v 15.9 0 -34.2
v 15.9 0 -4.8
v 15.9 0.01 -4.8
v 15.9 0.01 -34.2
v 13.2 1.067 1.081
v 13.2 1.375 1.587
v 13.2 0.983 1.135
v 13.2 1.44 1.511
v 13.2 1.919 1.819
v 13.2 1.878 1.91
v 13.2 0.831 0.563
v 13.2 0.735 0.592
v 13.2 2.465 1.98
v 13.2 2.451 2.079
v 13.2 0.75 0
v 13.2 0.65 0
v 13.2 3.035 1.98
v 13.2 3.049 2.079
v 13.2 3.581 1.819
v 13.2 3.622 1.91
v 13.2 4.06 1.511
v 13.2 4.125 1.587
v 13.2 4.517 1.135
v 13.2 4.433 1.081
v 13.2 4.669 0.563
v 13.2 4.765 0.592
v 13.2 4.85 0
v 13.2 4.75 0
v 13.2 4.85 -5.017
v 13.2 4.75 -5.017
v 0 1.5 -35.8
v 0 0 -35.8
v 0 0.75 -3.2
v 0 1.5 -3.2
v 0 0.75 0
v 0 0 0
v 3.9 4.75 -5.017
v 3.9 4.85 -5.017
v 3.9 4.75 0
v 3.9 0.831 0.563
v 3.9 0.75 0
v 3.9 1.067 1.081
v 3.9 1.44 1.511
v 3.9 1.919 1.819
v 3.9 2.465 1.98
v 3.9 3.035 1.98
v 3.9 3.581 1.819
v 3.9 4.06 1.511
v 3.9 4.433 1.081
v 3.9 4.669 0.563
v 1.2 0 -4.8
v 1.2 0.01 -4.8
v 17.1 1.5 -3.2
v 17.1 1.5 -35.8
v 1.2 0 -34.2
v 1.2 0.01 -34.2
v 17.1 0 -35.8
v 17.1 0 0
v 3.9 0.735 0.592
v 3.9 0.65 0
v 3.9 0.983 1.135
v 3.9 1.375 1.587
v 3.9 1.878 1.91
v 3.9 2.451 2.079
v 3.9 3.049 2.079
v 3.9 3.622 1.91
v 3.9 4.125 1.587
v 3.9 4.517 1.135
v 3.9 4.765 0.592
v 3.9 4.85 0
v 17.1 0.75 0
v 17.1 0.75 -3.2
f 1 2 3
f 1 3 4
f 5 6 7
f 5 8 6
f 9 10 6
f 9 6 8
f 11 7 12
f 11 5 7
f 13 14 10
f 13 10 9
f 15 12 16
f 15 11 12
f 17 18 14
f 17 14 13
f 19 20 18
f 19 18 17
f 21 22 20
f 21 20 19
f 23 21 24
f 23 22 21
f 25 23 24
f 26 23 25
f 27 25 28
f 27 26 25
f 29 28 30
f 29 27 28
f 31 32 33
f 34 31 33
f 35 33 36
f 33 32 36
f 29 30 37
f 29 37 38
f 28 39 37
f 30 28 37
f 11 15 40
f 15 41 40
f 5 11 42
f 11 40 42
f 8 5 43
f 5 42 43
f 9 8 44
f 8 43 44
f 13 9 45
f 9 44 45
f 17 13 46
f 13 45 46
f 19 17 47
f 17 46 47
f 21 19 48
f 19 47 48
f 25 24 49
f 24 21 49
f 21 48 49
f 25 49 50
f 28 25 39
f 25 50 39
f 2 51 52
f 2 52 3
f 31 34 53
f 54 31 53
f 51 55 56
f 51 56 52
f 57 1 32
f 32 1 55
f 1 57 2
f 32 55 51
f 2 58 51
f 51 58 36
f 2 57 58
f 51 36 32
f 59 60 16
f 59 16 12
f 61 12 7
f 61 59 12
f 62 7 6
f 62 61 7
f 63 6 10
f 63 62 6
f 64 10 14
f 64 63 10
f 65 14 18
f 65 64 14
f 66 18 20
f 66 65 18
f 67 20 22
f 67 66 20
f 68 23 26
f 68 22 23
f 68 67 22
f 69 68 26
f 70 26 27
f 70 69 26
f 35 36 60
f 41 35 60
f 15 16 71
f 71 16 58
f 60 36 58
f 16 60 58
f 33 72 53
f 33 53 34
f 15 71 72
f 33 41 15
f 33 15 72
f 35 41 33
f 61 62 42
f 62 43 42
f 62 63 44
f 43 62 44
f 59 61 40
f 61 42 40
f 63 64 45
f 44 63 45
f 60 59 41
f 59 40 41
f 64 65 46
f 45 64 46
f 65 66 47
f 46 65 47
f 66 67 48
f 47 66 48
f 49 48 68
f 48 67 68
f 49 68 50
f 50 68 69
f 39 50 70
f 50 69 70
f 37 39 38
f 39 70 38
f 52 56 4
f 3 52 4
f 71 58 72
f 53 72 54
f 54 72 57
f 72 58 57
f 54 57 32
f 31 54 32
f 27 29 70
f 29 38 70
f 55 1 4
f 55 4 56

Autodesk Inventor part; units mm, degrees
ref_plane "YZ Plane" through (0, 0, 0) normal (1, 0, 0) x (0, 1, 0)
ref_plane "XZ Plane" through (0, 0, 0) normal (0, 1, 0) x (-1, 0, 0)
sketch "Эскиз1" plane through (0, 0, 0) normal (0, 1, 0) x (-1, 0, 0)
  line L0 (0, 0) -> (-17.1, 0)
  line L1 (-17.1, 0) -> (-17.1, -35.8)
  line L2 (-17.1, -35.8) -> (0, -35.8)
  line L3 (0, -35.8) -> (0, 0)
  dimension "d0" = 17.1
  dimension "d1" = 35.8
extrude "Выдавливание1" add sketch "Эскиз1" along normal blind 0.75
sketch "Эскиз2" plane through (0, 0.75, 0) normal (0, 1, 0) x (1, 0, 0)
  line L0 (0, 35.8) -> (0, 0) projected
  line L1 (17.1, 0) -> (17.1, 35.8) projected
  line L2 (0, 35.8) -> (17.1, 35.8)
  line L3 (17.1, 35.8) -> (17.1, 3.2)
  line L4 (17.1, 3.2) -> (0, 3.2)
  line L5 (0, 3.2) -> (0, 35.8)
  point P0 (0, 3.2)
  dimension "d4" = 32.6
extrude "Выдавливание2" add sketch "Эскиз2" along normal blind 0.75
sketch "Эскиз3" plane through (0, 0, 0) normal (0, -1, 0) x (1, 0, 0)
  line L0 (0, -35.8) -> (0, -3.2) projected
  line L1 (0, -3.2) -> (17.1, -3.2) projected
  line L2 (17.1, -3.2) -> (17.1, -35.8) projected
  line L3 (17.1, -35.8) -> (0, -35.8) projected
  line L4 (15.9, -34.2) -> (1.2, -34.2)
  line L5 (1.2, -34.2) -> (1.2, -4.8)
  line L6 (1.2, -4.8) -> (15.9, -4.8)
  line L7 (15.9, -4.8) -> (15.9, -34.2)
  point P0 (0, 0)
  point P1 (8.55, -34.2)
  point P2 (8.55, -35.8)
  point P3 (15.9, -19.5)
  point P4 (17.1, -19.5)
  dimension "d7" = 29.4
  dimension "d8" = 14.7
extrude "Выдавливание3" cut sketch "Эскиз3" against normal blind 0.01 contours L4 L5 L6 L7
ref_plane "РабПлоскость1" through (8.55, 0, 0) normal (1, 0, 0) x (0, 0, -1)
sketch "Эскиз4" plane through (8.55, 0, 0) normal (1, 0, 0) x (0, 0, -1)
  line L0 (0, 0) -> (0, 0.75) projected
  arc A0 (0, 4.75) -> (0, 0.75) centre (0, 2.75) ccw
  arc A1 (0, 4.85) -> (0, 0.65) centre (0, 2.75) ccw
  line L1 (0, 4.75) -> (5.0168, 4.75)
  line L2 (5.0168, 4.75) -> (5.0168, 4.85)
  line L3 (5.0168, 4.85) -> (0, 4.85)
  dimension "d11" = 0.1
  dimension "d12" = 2
  dimension "d13" = 5.0168
extrude "Выдавливание4" add sketch "Эскиз4" along normal mid plane 9.3
properties part number "Display_1.3"
